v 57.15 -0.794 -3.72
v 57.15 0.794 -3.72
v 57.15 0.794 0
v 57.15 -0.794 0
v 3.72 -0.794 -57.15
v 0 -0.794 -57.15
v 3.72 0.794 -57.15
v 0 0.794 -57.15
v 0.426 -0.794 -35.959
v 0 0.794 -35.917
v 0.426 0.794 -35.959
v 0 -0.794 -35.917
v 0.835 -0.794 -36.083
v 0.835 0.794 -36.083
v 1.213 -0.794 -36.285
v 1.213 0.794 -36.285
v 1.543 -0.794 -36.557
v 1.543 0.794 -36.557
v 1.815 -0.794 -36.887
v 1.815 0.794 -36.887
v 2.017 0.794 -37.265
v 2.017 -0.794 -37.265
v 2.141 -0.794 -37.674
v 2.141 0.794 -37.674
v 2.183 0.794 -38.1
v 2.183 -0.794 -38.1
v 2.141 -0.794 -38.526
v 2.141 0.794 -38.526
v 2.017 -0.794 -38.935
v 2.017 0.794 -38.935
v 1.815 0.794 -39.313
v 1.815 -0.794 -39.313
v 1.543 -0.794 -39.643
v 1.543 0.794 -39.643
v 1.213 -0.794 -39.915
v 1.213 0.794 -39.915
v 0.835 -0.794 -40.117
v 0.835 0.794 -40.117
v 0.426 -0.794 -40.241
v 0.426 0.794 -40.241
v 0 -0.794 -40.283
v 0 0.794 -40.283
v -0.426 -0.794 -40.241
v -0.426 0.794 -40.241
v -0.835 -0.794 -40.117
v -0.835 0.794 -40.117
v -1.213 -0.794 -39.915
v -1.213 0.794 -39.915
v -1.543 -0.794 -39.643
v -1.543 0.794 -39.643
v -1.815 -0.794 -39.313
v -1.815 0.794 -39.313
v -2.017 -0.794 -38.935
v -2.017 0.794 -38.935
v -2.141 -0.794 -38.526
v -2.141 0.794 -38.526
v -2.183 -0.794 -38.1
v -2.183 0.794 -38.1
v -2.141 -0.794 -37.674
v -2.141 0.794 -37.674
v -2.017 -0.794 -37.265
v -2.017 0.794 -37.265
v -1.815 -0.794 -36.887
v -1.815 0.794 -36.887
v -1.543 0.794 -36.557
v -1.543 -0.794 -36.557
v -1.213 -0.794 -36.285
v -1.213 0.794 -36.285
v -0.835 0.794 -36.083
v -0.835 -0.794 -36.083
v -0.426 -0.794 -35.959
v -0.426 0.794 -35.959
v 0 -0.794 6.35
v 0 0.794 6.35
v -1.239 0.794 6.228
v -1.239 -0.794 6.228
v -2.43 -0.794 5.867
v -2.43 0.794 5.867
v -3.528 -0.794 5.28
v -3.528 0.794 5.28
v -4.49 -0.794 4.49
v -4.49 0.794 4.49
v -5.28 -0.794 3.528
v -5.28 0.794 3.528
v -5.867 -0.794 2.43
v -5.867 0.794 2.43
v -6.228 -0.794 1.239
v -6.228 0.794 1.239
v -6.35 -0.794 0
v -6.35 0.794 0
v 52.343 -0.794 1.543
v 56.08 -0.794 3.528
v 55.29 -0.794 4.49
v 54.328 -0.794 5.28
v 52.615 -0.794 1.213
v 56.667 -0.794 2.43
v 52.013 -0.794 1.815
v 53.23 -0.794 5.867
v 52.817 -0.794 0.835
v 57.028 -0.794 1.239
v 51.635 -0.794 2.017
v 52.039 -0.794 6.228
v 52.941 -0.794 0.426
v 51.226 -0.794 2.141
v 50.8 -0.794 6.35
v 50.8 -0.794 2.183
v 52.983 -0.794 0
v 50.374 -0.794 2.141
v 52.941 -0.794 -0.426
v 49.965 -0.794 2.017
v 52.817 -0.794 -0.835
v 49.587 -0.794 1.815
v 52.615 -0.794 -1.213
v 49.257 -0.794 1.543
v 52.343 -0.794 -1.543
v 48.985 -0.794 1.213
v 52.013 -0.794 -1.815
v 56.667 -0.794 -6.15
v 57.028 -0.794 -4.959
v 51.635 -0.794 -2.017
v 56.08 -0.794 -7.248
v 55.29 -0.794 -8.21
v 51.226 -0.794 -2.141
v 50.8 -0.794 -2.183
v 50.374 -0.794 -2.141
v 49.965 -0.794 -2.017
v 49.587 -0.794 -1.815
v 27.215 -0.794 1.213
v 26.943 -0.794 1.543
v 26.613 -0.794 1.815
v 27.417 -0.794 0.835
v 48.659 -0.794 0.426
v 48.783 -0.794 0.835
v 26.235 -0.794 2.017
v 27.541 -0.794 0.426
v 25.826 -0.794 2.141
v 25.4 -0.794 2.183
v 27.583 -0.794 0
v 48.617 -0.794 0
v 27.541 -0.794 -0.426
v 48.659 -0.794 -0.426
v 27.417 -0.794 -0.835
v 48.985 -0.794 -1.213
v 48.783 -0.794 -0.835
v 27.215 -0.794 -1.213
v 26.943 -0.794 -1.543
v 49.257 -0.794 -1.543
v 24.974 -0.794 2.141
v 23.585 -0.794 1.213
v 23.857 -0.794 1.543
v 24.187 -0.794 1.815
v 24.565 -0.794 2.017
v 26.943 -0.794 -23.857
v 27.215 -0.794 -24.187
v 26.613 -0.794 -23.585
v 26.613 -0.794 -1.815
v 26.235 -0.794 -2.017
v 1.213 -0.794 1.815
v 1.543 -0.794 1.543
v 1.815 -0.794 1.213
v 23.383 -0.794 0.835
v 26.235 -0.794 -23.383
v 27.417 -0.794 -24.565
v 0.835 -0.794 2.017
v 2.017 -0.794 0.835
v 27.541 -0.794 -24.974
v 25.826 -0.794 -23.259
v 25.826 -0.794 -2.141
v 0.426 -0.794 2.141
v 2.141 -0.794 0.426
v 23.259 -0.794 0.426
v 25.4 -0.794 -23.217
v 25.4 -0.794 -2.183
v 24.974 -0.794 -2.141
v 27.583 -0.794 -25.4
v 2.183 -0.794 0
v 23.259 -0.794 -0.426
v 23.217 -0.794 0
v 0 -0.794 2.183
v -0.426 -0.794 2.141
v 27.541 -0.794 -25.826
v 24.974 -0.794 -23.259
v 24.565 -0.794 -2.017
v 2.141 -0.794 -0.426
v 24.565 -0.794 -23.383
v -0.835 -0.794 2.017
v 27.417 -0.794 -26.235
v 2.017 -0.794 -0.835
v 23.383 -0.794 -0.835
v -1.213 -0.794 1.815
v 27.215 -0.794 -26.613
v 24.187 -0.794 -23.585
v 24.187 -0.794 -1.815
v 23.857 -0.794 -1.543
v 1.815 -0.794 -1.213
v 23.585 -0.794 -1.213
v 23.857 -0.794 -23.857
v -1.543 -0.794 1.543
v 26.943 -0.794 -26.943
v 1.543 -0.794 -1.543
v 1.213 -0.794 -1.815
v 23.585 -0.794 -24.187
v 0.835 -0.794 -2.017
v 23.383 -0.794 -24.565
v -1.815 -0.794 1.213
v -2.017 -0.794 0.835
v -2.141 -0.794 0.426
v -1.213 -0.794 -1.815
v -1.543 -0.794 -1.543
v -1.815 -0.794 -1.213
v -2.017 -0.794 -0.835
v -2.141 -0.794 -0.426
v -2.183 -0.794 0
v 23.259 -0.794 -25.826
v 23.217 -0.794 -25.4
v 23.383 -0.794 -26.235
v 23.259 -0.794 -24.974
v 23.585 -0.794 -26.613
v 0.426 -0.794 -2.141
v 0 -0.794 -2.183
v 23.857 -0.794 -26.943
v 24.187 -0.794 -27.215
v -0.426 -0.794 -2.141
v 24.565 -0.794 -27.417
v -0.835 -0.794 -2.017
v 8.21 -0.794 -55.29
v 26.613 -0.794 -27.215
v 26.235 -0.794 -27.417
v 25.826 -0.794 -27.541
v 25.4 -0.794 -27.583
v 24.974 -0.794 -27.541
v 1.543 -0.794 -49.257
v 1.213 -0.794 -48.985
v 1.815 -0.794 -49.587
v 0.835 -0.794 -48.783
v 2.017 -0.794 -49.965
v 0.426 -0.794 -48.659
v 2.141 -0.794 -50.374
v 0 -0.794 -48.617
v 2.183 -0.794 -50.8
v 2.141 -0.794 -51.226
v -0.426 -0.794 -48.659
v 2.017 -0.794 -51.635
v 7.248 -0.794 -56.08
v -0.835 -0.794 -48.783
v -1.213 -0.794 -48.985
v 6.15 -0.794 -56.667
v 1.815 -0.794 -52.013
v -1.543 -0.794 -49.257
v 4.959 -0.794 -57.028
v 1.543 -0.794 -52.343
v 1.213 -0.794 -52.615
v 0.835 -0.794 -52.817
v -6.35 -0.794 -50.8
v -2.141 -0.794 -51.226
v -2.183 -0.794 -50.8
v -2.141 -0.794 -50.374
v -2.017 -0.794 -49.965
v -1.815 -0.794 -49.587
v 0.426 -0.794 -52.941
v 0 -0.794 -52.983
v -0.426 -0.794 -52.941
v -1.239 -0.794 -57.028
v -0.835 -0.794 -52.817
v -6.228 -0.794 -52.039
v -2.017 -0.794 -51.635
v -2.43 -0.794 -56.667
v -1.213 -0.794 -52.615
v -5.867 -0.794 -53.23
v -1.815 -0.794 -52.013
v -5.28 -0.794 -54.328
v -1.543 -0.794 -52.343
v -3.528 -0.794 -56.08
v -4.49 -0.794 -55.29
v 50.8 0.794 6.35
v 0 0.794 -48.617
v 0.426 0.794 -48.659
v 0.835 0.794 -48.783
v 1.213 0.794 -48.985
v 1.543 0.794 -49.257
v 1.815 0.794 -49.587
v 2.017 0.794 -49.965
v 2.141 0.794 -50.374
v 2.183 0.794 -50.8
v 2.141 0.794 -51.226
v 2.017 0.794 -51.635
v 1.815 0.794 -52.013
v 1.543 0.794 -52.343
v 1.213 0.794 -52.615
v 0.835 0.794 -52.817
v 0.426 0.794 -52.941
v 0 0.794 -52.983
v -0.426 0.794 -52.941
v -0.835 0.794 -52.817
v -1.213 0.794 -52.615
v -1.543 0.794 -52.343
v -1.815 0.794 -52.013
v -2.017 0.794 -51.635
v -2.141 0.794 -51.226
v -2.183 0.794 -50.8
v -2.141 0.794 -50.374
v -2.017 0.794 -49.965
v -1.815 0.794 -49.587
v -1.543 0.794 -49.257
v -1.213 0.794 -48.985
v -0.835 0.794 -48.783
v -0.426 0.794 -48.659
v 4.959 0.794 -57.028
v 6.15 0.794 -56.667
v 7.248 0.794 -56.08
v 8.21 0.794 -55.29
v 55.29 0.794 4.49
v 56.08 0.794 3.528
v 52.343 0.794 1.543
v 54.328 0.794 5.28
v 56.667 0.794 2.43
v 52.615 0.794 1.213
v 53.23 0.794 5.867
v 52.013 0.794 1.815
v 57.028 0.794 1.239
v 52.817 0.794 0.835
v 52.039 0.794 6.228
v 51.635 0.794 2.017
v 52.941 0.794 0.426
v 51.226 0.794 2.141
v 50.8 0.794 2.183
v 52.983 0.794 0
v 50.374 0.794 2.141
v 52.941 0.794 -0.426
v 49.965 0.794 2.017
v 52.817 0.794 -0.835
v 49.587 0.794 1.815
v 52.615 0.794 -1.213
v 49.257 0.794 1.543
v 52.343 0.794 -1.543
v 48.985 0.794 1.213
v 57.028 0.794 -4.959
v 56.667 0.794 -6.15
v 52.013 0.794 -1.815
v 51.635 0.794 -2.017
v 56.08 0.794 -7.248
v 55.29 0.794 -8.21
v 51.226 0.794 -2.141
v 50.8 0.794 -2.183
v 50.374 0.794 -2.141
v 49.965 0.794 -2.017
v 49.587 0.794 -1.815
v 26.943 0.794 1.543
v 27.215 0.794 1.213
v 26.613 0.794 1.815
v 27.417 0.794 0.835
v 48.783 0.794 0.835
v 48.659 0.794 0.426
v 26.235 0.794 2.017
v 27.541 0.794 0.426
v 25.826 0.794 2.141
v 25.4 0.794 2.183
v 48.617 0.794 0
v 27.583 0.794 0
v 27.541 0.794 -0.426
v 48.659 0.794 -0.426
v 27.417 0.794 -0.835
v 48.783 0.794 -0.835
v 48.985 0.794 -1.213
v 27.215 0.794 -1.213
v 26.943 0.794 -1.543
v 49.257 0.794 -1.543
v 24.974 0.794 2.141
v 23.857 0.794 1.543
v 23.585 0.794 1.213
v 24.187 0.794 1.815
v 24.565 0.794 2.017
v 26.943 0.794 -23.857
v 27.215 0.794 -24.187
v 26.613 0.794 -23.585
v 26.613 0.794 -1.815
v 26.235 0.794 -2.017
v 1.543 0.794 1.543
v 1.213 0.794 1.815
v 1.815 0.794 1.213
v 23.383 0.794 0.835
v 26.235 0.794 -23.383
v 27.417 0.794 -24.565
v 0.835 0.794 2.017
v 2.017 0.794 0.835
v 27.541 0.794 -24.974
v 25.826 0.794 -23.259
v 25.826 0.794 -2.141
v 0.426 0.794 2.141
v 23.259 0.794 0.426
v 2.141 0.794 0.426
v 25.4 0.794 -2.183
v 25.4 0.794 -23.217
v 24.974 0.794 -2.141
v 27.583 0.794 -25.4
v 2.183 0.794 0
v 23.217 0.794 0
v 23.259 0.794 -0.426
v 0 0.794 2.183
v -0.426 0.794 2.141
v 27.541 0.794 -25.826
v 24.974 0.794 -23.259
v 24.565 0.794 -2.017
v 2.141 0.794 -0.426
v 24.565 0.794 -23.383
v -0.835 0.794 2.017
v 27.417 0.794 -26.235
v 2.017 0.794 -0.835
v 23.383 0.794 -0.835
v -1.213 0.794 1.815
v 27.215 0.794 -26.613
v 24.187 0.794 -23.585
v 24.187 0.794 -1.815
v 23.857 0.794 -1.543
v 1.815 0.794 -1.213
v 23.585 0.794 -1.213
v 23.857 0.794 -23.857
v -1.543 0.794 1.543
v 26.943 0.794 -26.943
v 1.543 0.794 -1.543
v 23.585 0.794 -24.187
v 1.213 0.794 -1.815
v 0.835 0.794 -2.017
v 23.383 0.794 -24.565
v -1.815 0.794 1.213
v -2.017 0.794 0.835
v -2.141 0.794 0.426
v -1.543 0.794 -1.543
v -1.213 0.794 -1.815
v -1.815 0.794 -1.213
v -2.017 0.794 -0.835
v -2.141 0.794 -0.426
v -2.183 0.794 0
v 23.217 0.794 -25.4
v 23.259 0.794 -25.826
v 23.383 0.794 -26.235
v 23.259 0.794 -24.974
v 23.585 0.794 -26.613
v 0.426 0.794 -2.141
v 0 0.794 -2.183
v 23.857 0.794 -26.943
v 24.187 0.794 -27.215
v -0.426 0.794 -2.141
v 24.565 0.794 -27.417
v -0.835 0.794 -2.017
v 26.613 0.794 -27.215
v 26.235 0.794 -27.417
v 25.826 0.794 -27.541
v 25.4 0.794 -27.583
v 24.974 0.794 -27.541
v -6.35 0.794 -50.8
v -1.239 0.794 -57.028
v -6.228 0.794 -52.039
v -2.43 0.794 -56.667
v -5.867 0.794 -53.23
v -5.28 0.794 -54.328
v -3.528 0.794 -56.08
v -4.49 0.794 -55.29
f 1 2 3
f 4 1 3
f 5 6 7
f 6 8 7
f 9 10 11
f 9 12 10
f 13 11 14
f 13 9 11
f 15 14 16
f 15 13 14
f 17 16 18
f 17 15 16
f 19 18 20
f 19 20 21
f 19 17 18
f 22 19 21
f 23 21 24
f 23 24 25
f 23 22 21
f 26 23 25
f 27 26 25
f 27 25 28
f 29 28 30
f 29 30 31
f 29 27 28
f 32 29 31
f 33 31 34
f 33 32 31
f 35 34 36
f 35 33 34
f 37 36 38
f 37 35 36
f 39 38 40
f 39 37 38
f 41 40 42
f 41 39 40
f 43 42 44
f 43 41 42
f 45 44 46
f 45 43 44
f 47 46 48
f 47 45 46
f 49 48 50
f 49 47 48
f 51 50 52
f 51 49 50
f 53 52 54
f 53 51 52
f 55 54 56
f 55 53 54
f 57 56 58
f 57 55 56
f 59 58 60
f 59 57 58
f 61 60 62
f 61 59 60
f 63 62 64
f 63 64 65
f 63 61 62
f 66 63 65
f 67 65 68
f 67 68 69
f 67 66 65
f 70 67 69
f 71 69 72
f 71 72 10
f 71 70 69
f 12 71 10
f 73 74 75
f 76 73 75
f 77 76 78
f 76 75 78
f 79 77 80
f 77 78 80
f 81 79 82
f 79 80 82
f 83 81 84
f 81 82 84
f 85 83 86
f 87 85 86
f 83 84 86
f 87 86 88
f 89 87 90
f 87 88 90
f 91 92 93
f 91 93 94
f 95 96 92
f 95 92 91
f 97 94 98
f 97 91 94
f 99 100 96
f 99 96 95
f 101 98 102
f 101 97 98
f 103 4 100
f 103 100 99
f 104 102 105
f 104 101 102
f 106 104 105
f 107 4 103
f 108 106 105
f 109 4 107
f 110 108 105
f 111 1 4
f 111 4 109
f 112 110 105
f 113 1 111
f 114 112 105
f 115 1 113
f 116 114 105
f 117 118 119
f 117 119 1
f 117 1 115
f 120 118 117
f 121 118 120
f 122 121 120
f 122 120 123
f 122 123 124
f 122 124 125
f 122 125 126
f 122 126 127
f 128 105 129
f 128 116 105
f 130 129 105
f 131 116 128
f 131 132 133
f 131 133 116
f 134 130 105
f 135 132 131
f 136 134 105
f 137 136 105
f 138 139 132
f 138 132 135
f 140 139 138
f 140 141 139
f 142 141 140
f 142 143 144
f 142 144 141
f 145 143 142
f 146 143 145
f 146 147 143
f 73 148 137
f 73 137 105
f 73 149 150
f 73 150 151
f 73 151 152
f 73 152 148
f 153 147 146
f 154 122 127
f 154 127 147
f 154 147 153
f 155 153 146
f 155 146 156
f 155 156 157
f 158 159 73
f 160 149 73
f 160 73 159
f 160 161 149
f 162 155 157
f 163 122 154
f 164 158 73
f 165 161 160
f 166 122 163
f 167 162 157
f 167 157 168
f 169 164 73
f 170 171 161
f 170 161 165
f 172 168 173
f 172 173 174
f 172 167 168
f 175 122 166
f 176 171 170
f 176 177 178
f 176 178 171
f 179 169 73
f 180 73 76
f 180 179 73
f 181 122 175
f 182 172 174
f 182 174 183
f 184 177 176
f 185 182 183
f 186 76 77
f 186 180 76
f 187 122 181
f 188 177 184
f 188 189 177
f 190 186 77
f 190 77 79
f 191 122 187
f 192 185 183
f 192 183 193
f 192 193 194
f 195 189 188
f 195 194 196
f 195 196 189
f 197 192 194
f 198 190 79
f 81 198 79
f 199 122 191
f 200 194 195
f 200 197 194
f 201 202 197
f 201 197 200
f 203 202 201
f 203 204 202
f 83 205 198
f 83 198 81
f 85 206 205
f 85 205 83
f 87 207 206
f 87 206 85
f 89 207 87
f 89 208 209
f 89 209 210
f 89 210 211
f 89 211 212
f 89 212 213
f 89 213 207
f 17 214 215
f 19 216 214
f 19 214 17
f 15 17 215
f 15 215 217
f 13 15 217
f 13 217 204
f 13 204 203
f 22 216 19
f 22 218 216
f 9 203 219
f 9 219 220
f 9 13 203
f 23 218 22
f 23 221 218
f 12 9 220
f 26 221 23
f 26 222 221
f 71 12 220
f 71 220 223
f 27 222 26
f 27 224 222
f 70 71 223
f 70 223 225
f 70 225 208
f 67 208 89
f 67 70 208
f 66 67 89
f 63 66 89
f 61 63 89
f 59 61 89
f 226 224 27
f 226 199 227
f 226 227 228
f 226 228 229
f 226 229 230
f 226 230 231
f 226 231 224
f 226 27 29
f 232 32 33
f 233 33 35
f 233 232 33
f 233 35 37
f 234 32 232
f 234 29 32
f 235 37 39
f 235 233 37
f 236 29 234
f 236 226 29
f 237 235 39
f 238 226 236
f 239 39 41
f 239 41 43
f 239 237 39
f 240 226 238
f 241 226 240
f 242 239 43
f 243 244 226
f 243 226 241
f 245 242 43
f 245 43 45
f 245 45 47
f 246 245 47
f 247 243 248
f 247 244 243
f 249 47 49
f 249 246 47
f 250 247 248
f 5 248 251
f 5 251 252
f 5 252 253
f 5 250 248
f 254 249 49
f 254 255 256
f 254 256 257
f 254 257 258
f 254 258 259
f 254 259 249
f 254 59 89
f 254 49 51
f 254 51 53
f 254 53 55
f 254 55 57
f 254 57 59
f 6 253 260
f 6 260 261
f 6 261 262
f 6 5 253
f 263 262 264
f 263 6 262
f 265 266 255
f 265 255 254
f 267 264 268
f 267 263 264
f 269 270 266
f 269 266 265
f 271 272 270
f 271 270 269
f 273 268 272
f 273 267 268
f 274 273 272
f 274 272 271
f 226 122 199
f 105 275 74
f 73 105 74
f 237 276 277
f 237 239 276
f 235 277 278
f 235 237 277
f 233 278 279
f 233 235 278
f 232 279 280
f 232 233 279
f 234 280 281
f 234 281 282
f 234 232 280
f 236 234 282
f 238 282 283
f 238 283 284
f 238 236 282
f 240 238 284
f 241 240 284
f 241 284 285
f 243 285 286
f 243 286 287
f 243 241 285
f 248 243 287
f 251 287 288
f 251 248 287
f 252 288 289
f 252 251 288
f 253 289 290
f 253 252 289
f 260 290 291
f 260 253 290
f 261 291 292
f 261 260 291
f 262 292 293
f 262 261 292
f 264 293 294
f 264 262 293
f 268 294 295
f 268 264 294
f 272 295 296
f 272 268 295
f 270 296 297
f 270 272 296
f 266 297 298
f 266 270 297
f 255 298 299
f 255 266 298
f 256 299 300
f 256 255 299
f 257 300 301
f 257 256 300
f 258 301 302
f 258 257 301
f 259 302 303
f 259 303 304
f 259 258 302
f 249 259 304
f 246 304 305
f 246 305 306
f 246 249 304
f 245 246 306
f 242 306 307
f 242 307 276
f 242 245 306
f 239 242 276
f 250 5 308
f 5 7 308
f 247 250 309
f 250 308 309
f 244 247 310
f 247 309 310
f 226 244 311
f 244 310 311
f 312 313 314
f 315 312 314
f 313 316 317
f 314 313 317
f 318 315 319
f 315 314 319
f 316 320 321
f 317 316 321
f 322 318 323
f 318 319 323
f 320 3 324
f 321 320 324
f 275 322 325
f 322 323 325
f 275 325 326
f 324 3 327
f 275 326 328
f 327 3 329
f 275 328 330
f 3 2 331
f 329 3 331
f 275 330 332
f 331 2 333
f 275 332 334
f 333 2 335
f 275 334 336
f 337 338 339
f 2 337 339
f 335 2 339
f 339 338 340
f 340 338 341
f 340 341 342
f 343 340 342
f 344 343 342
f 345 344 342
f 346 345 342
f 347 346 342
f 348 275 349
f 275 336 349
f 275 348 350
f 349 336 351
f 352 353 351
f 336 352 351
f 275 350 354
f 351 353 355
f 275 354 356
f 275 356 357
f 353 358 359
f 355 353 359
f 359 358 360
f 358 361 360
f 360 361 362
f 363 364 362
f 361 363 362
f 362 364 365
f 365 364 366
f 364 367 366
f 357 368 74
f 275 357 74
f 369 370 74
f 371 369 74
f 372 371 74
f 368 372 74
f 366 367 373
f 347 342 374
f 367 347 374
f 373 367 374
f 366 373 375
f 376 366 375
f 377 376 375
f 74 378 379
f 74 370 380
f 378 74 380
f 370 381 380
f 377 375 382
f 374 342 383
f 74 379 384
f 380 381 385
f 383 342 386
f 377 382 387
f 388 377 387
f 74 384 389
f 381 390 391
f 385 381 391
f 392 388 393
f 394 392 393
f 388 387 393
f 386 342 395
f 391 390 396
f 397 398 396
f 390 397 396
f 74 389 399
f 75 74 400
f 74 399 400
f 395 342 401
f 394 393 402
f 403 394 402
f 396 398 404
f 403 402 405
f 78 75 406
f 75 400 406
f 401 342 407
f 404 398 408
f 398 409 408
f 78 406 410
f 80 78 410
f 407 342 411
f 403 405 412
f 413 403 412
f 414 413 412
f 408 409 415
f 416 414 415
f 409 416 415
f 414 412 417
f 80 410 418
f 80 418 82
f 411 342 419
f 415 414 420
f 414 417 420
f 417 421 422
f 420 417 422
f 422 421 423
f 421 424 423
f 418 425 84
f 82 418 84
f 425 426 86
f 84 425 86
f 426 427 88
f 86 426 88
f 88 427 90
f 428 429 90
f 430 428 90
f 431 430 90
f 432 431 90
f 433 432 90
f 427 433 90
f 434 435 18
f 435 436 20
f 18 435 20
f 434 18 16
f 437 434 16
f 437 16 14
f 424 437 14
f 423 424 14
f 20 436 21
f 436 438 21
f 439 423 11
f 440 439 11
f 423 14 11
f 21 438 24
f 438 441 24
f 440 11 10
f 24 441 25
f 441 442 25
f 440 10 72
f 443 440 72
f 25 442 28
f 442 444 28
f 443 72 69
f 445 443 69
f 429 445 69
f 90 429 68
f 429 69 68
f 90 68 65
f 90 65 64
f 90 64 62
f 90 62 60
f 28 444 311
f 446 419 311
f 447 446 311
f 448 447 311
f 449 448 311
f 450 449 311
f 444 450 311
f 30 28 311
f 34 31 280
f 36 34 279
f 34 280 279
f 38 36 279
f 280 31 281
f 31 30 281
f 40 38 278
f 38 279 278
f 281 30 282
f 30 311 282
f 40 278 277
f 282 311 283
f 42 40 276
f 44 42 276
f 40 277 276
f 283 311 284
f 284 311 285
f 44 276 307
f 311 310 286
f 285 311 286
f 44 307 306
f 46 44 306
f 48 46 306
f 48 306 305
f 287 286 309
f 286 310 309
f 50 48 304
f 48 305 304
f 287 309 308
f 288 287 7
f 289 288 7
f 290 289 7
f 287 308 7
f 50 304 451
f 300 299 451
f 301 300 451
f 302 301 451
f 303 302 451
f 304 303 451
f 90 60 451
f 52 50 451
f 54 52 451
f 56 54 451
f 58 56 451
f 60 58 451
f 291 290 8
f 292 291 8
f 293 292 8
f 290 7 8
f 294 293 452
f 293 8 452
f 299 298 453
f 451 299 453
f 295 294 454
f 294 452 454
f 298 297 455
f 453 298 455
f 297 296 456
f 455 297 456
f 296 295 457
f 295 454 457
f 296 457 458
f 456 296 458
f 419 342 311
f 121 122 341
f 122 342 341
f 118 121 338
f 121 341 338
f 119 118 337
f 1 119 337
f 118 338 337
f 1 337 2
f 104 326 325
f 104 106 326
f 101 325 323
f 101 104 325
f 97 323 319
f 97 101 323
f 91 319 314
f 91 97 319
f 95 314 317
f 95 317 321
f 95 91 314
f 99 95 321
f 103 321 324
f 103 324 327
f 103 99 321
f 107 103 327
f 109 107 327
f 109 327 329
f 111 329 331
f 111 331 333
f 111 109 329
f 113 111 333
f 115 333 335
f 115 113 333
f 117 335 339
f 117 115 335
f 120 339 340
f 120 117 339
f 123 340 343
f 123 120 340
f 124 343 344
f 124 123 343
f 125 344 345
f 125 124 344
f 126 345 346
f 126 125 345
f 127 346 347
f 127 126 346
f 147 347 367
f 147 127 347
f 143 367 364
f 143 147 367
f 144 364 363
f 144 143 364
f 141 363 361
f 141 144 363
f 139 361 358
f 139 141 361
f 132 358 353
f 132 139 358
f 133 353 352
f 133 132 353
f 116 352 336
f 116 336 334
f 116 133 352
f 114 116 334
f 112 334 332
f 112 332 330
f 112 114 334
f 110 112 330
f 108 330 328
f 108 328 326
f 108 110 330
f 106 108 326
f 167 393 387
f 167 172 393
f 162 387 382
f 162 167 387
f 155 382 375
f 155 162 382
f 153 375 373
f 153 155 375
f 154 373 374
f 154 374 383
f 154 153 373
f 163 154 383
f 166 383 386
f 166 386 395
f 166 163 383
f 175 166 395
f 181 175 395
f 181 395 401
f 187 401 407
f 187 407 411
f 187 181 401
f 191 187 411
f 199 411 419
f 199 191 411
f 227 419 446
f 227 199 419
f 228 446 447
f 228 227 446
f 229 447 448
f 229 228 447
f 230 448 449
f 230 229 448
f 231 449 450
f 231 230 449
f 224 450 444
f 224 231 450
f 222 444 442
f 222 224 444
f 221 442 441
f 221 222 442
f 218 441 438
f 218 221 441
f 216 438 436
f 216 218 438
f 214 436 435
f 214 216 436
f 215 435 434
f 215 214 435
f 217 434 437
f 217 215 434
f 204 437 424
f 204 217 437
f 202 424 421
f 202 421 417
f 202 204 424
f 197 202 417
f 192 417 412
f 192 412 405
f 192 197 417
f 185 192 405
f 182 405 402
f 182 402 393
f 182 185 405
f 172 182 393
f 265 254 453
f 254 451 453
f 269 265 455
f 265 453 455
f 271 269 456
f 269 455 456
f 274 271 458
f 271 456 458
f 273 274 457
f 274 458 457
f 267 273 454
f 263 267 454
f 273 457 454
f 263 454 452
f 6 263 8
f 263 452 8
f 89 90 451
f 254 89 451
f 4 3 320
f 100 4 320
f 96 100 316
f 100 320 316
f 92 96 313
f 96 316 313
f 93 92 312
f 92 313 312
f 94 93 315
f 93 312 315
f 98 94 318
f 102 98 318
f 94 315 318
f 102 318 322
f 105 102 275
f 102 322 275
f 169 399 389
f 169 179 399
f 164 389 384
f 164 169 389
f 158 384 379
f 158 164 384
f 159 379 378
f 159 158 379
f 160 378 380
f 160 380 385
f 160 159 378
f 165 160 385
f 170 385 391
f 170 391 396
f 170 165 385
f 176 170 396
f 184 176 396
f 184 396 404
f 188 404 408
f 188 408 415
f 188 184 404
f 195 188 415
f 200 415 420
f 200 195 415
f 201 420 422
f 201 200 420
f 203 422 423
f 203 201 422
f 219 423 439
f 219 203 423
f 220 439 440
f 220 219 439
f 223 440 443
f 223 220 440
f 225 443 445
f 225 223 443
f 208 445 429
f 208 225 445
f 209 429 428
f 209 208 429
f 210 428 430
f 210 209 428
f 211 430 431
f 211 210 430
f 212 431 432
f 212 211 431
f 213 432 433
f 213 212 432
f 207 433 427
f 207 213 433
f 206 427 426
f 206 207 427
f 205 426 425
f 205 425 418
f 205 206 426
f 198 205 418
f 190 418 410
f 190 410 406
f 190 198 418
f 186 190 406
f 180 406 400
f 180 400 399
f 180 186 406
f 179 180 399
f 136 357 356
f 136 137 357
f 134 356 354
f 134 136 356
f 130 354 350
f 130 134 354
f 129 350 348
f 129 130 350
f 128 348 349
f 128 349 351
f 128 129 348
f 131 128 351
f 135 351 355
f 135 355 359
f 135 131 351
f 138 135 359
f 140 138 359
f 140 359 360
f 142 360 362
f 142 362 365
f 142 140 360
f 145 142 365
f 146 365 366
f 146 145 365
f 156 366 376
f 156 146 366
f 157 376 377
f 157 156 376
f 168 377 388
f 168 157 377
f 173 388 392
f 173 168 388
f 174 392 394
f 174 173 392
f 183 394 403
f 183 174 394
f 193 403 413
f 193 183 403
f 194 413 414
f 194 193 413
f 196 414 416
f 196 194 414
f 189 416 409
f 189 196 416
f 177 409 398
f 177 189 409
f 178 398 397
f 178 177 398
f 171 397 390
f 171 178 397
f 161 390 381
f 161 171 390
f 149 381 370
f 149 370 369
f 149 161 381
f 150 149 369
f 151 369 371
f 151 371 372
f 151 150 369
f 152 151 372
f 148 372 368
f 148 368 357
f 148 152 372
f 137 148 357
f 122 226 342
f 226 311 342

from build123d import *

# Parameters (mm, degrees)
SKETCH1_R           = 2.1828125
BOSS_EXTRUDE1_DEPTH = 0.79375


with BuildPart() as part:
    # Sketch1 → Boss-Extrude1 (new, symmetric)
    with BuildSketch(Plane(origin=(0, 0, 0), x_dir=(1, 0, 0), z_dir=(0, 1, 0))):
        with BuildLine():
            Line((-6.35, 0), (-6.35, 50.8))
            ThreePointArc((-6.35, 50.8), (-4.490128061, 55.290128061), (0, 57.15))
            Line((0, 57.15), (3.719743879, 57.15))
            ThreePointArc((3.719743879, 57.15), (6.149783674, 56.666635031), (8.209871939, 55.290128061))
            Line((8.209871939, 55.290128061), (55.290128061, 8.209871939))
            ThreePointArc((55.290128061, 8.209871939), (56.666635031, 6.149783674), (57.15, 3.719743879))
            Line((57.15, 3.719743879), (57.15, 0))
            ThreePointArc((57.15, 0), (55.290128061, -4.490128061), (50.8, -6.35))
            Line((50.8, -6.35), (0, -6.35))
            ThreePointArc((0, -6.35), (-4.490128061, -4.490128061), (-6.35, 0))
        make_face()
        with Locations(Location((0, 0, 0), (0, 0, 270))):
            Circle(SKETCH1_R, mode=Mode.SUBTRACT)
        with Locations(Location((0, 50.8, 0), (0, 0, 270))):
            Circle(SKETCH1_R, mode=Mode.SUBTRACT)
        with Locations(Location((50.8, 0, 0), (0, 0, 270))):
            Circle(SKETCH1_R, mode=Mode.SUBTRACT)
        with Locations(Location((25.4, 0, 0), (0, 0, 270))):
            Circle(SKETCH1_R, mode=Mode.SUBTRACT)
        with Locations(Location((0, 38.1, 0), (0, 0, 270))):
            Circle(SKETCH1_R, mode=Mode.SUBTRACT)
        with Locations(Location((25.4, 25.4, 0), (0, 0, 270))):
            Circle(SKETCH1_R, mode=Mode.SUBTRACT)
    extrude(amount=BOSS_EXTRUDE1_DEPTH, both=True)


solid = part.part
